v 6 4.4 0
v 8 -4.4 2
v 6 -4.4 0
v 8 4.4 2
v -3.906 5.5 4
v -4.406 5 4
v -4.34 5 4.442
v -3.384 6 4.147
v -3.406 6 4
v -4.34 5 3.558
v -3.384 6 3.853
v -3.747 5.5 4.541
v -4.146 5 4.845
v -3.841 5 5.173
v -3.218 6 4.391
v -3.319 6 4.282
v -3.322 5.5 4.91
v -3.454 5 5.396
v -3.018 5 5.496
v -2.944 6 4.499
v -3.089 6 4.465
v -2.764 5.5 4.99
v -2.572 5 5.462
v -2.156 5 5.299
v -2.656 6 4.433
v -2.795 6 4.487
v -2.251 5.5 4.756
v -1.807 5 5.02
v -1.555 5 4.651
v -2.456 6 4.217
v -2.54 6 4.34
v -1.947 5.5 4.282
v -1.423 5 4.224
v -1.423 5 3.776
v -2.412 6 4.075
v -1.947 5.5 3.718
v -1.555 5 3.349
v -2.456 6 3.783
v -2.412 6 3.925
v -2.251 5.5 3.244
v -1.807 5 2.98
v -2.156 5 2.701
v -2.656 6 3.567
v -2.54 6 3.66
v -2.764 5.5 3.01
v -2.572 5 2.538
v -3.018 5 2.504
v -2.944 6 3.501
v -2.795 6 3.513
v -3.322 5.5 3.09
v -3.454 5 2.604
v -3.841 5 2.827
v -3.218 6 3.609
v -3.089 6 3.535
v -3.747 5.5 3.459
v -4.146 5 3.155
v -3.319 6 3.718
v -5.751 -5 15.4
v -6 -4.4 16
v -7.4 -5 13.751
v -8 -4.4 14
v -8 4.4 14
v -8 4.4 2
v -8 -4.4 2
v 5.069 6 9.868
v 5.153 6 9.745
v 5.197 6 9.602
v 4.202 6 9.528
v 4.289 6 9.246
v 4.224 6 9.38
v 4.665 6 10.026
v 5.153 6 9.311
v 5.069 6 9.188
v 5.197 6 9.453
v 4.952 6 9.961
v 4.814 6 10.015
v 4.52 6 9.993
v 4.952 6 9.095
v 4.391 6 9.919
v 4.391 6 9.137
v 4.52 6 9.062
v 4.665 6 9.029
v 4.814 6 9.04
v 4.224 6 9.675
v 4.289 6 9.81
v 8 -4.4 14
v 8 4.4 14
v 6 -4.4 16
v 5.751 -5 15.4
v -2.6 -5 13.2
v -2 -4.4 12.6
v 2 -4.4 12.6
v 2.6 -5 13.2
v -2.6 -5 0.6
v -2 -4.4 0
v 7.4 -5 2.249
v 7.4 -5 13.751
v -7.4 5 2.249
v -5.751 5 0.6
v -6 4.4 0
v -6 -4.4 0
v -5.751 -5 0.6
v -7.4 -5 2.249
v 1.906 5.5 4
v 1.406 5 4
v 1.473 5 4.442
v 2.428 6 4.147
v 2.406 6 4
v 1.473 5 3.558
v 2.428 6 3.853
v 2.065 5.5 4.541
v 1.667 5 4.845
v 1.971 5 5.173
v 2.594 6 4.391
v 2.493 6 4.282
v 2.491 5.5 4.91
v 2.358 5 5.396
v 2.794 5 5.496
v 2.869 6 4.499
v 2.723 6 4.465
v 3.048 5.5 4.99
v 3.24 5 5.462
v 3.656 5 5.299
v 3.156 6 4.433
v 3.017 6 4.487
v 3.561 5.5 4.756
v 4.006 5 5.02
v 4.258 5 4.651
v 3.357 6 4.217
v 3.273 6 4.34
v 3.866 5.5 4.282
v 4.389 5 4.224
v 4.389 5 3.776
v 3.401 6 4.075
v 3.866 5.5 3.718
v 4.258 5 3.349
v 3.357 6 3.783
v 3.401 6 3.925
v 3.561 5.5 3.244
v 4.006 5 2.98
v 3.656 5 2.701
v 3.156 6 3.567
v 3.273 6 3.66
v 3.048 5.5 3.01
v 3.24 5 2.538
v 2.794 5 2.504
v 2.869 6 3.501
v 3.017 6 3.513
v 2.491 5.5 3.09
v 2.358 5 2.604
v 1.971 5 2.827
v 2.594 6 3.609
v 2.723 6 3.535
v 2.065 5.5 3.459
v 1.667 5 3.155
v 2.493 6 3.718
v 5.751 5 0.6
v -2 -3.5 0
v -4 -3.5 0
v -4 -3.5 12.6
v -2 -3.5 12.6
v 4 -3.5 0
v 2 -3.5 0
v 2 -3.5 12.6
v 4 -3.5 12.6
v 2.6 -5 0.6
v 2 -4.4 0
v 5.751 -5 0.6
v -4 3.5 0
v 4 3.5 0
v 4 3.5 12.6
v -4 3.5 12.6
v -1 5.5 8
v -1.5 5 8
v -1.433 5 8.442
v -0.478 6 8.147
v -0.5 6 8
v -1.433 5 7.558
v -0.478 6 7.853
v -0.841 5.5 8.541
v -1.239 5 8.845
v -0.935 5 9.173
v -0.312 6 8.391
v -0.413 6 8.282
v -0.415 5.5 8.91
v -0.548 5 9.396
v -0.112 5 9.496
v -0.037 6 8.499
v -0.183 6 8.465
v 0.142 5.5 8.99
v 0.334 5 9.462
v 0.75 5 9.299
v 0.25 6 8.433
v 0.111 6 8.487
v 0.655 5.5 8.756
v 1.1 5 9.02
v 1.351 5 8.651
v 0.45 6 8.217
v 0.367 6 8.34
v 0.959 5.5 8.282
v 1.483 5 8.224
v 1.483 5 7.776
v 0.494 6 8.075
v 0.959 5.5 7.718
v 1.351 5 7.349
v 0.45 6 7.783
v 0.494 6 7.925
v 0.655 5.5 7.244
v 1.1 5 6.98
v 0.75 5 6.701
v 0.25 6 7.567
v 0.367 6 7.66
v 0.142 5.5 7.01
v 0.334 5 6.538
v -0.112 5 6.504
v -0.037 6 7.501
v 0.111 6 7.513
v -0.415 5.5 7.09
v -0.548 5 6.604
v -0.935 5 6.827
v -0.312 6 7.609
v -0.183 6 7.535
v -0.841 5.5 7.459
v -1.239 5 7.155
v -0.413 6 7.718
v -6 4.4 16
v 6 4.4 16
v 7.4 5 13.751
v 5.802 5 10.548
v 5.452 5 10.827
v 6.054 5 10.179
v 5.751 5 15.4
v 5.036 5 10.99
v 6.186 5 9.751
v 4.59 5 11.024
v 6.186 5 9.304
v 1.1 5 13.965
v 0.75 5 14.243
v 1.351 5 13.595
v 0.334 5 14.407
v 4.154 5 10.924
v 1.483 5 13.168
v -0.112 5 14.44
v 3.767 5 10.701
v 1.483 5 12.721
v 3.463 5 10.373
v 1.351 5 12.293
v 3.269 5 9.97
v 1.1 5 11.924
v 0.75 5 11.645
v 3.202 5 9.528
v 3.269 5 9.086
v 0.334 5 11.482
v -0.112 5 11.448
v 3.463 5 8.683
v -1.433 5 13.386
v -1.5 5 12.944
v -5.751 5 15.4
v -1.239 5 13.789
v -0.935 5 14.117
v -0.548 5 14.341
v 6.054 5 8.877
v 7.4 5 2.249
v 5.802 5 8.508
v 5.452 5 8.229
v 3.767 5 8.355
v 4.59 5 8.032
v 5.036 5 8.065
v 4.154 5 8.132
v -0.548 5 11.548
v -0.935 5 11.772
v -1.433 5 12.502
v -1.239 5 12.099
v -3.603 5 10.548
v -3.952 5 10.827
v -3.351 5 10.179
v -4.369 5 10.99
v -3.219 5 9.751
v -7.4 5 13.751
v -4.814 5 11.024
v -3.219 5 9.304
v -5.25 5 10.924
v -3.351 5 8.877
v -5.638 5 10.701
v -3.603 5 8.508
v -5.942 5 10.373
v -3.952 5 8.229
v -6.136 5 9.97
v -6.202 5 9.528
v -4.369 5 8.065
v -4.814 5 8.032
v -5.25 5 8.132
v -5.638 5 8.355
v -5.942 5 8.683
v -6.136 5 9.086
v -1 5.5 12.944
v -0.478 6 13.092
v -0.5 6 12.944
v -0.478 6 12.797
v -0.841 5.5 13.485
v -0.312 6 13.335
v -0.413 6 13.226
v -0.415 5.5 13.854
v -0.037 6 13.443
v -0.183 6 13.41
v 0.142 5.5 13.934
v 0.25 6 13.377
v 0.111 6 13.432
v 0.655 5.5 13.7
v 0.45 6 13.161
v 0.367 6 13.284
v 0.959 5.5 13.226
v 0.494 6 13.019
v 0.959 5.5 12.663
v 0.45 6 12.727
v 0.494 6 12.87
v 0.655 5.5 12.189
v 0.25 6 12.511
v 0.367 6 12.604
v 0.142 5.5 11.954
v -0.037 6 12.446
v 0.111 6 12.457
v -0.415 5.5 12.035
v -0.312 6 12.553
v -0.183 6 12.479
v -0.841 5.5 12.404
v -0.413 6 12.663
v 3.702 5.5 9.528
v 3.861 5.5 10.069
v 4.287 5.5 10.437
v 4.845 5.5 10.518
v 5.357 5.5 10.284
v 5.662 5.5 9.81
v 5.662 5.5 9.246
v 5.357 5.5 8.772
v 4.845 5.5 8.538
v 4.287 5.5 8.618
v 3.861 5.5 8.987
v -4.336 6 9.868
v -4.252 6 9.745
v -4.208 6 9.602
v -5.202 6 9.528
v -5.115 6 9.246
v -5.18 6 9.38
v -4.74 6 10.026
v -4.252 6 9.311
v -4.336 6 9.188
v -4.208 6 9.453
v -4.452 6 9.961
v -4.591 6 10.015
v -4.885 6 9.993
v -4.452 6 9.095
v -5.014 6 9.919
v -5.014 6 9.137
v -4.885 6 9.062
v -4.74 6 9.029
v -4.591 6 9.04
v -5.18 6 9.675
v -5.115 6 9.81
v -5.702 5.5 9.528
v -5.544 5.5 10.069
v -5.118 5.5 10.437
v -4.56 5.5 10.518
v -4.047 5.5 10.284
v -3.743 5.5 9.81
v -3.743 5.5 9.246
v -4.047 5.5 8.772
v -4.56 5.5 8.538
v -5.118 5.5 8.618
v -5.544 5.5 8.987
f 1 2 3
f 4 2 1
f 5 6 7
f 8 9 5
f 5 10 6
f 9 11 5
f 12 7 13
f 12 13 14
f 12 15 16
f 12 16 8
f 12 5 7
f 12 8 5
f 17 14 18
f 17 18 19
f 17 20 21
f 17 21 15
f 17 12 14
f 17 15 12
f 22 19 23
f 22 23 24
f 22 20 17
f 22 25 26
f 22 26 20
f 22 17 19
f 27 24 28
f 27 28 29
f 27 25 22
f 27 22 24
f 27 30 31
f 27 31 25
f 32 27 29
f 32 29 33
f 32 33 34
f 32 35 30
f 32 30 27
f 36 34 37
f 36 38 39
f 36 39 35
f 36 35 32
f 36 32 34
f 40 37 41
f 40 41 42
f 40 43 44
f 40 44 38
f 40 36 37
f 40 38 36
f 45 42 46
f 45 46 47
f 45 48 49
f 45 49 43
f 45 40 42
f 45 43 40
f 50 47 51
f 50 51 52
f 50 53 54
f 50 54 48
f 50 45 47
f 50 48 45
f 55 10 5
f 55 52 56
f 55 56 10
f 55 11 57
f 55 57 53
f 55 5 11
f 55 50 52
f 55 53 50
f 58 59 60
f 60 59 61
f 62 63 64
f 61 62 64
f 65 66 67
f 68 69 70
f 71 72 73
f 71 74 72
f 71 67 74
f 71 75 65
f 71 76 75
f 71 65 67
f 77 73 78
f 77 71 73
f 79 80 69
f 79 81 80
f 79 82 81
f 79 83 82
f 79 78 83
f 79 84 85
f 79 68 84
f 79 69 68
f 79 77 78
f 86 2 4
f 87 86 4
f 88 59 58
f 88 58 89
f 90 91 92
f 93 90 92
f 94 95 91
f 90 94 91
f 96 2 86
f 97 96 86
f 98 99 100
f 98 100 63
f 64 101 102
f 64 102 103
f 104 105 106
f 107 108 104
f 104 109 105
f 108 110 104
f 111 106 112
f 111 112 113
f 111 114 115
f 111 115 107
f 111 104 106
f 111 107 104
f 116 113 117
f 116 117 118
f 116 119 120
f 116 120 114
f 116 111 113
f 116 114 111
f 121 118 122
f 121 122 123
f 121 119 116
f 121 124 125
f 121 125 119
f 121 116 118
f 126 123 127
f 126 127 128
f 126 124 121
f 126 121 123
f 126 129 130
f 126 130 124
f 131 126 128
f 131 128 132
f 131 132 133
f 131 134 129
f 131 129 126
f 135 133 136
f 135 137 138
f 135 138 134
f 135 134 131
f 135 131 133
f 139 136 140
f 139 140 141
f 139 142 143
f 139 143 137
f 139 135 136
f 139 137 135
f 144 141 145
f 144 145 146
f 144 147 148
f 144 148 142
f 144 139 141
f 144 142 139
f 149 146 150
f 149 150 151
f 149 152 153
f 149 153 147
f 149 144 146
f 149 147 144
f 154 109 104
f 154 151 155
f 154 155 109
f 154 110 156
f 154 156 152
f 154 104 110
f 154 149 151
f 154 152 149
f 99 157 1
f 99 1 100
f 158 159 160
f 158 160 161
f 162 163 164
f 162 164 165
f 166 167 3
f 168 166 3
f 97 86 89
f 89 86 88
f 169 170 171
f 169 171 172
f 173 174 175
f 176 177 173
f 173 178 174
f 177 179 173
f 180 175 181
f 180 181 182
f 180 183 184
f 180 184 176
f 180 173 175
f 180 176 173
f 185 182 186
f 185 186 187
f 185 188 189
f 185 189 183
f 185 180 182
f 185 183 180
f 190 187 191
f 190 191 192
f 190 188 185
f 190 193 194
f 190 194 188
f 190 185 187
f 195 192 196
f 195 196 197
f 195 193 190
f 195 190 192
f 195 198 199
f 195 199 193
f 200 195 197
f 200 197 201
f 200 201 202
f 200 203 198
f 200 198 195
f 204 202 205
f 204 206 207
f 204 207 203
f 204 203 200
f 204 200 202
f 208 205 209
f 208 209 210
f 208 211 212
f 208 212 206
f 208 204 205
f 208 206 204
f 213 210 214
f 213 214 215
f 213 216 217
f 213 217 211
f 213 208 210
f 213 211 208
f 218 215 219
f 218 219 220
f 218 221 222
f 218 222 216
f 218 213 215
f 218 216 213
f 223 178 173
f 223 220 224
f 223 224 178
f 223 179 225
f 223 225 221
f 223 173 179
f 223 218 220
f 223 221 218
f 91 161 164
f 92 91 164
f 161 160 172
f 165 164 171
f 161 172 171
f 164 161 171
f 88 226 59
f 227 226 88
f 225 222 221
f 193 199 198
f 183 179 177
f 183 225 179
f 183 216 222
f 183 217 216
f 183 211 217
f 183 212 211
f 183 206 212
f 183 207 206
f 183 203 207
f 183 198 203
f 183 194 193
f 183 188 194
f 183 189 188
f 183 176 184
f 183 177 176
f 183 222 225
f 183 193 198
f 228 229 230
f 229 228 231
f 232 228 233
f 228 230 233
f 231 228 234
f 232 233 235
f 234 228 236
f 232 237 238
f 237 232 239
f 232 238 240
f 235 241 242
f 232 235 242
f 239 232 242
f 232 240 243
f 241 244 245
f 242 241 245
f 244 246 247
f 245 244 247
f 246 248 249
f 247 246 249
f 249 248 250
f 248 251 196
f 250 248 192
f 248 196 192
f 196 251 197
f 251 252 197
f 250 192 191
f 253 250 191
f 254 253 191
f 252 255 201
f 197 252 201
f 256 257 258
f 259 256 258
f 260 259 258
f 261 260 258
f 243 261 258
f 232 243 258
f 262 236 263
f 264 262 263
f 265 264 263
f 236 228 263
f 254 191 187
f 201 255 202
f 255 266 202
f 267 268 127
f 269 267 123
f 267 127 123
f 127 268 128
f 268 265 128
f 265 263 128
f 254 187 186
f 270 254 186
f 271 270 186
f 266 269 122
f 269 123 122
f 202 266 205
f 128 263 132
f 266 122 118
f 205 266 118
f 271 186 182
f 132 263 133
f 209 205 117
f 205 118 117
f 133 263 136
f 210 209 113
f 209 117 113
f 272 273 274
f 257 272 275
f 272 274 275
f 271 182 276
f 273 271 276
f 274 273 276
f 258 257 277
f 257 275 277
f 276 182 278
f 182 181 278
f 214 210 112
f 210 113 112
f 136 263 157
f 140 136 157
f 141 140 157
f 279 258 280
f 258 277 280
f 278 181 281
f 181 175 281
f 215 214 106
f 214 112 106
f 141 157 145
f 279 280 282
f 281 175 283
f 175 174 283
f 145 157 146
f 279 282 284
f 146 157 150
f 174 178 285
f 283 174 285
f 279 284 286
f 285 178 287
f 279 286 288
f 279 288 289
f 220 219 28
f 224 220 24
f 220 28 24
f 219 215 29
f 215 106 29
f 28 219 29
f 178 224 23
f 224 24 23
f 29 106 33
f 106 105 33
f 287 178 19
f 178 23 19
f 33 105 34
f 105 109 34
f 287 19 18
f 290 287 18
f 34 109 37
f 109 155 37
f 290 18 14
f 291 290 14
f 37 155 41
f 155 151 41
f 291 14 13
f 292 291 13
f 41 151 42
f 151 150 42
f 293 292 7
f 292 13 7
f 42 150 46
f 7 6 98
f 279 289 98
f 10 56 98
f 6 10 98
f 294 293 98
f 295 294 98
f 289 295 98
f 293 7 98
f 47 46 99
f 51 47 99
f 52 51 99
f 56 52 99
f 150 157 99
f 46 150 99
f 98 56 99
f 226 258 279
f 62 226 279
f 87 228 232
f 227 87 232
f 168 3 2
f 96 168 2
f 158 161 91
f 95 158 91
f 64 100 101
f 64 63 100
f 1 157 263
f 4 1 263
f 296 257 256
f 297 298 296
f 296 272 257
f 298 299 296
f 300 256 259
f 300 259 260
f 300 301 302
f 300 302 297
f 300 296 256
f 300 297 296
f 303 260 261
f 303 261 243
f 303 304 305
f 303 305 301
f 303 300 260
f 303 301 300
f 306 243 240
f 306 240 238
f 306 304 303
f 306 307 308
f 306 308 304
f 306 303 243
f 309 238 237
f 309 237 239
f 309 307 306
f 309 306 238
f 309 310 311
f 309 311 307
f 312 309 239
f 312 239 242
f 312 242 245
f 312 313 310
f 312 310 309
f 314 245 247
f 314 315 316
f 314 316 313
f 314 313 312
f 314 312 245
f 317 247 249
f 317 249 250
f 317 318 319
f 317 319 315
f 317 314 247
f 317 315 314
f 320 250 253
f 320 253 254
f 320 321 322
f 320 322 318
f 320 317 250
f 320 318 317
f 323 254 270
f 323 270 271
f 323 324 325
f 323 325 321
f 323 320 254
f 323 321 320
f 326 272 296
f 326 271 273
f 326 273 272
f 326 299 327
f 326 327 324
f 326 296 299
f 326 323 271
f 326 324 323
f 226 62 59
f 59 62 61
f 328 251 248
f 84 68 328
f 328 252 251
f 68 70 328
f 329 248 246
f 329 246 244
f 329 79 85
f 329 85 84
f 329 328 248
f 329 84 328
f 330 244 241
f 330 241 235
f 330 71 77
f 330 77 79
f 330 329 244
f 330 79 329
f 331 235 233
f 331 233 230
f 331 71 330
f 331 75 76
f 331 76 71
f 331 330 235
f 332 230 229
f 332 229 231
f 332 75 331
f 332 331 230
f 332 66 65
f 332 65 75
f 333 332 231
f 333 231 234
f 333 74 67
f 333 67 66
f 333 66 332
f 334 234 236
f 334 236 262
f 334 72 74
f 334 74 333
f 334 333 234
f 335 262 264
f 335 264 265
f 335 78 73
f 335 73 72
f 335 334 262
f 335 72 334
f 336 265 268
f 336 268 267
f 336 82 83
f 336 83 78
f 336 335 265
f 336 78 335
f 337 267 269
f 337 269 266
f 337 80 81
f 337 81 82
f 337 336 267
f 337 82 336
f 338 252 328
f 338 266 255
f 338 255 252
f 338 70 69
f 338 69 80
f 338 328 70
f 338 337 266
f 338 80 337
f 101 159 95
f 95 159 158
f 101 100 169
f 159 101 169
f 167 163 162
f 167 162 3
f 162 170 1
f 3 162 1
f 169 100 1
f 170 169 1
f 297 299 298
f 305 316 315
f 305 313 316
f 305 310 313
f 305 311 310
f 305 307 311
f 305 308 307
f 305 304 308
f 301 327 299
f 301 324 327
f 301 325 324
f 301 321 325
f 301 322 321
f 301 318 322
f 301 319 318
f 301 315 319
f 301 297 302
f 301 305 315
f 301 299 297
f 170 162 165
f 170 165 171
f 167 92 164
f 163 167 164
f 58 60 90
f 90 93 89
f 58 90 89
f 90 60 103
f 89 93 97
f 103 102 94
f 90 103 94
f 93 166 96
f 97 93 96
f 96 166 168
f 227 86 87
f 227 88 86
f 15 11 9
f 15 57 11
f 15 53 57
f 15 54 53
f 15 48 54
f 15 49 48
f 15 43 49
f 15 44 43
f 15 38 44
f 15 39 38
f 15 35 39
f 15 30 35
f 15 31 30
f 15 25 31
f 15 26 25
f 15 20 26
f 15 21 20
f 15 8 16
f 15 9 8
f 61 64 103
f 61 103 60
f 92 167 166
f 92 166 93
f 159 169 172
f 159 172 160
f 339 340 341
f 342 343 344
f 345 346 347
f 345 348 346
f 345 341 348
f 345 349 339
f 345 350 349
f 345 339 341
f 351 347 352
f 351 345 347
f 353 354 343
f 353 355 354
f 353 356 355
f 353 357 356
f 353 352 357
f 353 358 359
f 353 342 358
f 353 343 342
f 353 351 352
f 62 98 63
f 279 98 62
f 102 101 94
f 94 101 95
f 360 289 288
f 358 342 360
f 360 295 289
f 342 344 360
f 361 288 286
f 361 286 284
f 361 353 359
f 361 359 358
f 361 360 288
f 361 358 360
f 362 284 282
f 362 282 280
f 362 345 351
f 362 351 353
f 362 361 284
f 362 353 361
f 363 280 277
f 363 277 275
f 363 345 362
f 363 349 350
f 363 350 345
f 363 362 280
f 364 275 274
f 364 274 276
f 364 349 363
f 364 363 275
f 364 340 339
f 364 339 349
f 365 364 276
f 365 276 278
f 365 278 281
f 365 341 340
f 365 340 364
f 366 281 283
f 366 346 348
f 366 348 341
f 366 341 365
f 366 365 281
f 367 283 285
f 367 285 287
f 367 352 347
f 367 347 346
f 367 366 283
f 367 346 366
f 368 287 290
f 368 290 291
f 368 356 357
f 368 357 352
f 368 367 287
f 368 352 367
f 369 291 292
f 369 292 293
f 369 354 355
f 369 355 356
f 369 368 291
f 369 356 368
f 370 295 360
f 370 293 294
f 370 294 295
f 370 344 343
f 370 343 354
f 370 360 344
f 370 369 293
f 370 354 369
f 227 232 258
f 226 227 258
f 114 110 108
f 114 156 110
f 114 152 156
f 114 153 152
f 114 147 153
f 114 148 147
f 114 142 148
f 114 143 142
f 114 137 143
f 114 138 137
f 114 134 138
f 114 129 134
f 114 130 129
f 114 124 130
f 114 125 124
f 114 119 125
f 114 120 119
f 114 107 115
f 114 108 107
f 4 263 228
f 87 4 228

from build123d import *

# Parameters (mm, degrees)
F2_DEPTH = 16
F3_DEPTH = 12.6
F4_SIZE  = 2
F5_SIZE  = 0.6
F6_R     = 1.5
F7_DEPTH = 1
F7_TAPER = 45


with BuildPart() as f2:
    # F1 (on Top) → F2 (new body)
    with BuildSketch(Plane.XY):
        Polygon((-8, -5), (-2, -5), (-2, -3.5), (-4, -3.5), (-4, 3.5), (4, 3.5), (4, -3.5), (2, -3.5), (2, -5), (8, -5), (8, 5), (-8, 5), align=None)
        Polygon((-2, -3.5), (-2, -5), (2, -5), (2, -3.5), (4, -3.5), (4, 3.5), (-4, 3.5), (-4, -3.5), align=None)
    extrude(amount=F2_DEPTH)

    # F1 (on Top) → F3 (cut)
    with BuildSketch(Plane.XY):
        Polygon((-2, -3.5), (-2, -5), (2, -5), (2, -3.5), (4, -3.5), (4, 3.5), (-4, 3.5), (-4, -3.5), align=None)
    extrude(amount=F3_DEPTH, mode=Mode.SUBTRACT)

    # F4
    f4_edges = [f2.edges().sort_by_distance(p)[0] for p in [
        (-8, 0, 0),
        (-8, 0, 16),
        (8, 0, 16),
        (8, 0, 0),
    ]]
    chamfer(f4_edges, length=F4_SIZE)

    # F5
    f5_edges = [f2.edges().sort_by_distance(p)[0] for p in [
        (8, 5, 8),
        (7, 5, 1),
        (7, 5, 15),
        (0, 5, 0),
        (0, 5, 16),
        (-7, 5, 1),
        (-7, 5, 15),
        (-8, 5, 8),
        (-4, -5, 0),
        (-7, -5, 1),
        (-2, -5, 6.3),
        (-8, -5, 8),
        (0, -5, 12.6),
        (-7, -5, 15),
        (2, -5, 6.3),
        (0, -5, 16),
        (4, -5, 0),
        (7, -5, 15),
        (7, -5, 1),
        (8, -5, 8),
    ]]
    chamfer(f5_edges, length=F5_SIZE)

    # F6 (on face) → F7 (join)
    with BuildSketch(Plane(origin=(0, 5, 0), x_dir=(-1, 0, 0), z_dir=(0, 1, 0))):
        with Locations((-2.906170112, 4)):
            Circle(F6_R)
        with Locations((2.906170112, 4)):
            Circle(F6_R)
        with Locations((4.7022820183, 9.527864045)):
            Circle(F6_R)
        with Locations((0, 12.94427191)):
            Circle(F6_R)
        with Locations((-4.7022820183, 9.527864045)):
            Circle(F6_R)
        with Locations((0, 8)):
            Circle(F6_R)
    extrude(amount=F7_DEPTH, taper=F7_TAPER)


solid = f2.part
